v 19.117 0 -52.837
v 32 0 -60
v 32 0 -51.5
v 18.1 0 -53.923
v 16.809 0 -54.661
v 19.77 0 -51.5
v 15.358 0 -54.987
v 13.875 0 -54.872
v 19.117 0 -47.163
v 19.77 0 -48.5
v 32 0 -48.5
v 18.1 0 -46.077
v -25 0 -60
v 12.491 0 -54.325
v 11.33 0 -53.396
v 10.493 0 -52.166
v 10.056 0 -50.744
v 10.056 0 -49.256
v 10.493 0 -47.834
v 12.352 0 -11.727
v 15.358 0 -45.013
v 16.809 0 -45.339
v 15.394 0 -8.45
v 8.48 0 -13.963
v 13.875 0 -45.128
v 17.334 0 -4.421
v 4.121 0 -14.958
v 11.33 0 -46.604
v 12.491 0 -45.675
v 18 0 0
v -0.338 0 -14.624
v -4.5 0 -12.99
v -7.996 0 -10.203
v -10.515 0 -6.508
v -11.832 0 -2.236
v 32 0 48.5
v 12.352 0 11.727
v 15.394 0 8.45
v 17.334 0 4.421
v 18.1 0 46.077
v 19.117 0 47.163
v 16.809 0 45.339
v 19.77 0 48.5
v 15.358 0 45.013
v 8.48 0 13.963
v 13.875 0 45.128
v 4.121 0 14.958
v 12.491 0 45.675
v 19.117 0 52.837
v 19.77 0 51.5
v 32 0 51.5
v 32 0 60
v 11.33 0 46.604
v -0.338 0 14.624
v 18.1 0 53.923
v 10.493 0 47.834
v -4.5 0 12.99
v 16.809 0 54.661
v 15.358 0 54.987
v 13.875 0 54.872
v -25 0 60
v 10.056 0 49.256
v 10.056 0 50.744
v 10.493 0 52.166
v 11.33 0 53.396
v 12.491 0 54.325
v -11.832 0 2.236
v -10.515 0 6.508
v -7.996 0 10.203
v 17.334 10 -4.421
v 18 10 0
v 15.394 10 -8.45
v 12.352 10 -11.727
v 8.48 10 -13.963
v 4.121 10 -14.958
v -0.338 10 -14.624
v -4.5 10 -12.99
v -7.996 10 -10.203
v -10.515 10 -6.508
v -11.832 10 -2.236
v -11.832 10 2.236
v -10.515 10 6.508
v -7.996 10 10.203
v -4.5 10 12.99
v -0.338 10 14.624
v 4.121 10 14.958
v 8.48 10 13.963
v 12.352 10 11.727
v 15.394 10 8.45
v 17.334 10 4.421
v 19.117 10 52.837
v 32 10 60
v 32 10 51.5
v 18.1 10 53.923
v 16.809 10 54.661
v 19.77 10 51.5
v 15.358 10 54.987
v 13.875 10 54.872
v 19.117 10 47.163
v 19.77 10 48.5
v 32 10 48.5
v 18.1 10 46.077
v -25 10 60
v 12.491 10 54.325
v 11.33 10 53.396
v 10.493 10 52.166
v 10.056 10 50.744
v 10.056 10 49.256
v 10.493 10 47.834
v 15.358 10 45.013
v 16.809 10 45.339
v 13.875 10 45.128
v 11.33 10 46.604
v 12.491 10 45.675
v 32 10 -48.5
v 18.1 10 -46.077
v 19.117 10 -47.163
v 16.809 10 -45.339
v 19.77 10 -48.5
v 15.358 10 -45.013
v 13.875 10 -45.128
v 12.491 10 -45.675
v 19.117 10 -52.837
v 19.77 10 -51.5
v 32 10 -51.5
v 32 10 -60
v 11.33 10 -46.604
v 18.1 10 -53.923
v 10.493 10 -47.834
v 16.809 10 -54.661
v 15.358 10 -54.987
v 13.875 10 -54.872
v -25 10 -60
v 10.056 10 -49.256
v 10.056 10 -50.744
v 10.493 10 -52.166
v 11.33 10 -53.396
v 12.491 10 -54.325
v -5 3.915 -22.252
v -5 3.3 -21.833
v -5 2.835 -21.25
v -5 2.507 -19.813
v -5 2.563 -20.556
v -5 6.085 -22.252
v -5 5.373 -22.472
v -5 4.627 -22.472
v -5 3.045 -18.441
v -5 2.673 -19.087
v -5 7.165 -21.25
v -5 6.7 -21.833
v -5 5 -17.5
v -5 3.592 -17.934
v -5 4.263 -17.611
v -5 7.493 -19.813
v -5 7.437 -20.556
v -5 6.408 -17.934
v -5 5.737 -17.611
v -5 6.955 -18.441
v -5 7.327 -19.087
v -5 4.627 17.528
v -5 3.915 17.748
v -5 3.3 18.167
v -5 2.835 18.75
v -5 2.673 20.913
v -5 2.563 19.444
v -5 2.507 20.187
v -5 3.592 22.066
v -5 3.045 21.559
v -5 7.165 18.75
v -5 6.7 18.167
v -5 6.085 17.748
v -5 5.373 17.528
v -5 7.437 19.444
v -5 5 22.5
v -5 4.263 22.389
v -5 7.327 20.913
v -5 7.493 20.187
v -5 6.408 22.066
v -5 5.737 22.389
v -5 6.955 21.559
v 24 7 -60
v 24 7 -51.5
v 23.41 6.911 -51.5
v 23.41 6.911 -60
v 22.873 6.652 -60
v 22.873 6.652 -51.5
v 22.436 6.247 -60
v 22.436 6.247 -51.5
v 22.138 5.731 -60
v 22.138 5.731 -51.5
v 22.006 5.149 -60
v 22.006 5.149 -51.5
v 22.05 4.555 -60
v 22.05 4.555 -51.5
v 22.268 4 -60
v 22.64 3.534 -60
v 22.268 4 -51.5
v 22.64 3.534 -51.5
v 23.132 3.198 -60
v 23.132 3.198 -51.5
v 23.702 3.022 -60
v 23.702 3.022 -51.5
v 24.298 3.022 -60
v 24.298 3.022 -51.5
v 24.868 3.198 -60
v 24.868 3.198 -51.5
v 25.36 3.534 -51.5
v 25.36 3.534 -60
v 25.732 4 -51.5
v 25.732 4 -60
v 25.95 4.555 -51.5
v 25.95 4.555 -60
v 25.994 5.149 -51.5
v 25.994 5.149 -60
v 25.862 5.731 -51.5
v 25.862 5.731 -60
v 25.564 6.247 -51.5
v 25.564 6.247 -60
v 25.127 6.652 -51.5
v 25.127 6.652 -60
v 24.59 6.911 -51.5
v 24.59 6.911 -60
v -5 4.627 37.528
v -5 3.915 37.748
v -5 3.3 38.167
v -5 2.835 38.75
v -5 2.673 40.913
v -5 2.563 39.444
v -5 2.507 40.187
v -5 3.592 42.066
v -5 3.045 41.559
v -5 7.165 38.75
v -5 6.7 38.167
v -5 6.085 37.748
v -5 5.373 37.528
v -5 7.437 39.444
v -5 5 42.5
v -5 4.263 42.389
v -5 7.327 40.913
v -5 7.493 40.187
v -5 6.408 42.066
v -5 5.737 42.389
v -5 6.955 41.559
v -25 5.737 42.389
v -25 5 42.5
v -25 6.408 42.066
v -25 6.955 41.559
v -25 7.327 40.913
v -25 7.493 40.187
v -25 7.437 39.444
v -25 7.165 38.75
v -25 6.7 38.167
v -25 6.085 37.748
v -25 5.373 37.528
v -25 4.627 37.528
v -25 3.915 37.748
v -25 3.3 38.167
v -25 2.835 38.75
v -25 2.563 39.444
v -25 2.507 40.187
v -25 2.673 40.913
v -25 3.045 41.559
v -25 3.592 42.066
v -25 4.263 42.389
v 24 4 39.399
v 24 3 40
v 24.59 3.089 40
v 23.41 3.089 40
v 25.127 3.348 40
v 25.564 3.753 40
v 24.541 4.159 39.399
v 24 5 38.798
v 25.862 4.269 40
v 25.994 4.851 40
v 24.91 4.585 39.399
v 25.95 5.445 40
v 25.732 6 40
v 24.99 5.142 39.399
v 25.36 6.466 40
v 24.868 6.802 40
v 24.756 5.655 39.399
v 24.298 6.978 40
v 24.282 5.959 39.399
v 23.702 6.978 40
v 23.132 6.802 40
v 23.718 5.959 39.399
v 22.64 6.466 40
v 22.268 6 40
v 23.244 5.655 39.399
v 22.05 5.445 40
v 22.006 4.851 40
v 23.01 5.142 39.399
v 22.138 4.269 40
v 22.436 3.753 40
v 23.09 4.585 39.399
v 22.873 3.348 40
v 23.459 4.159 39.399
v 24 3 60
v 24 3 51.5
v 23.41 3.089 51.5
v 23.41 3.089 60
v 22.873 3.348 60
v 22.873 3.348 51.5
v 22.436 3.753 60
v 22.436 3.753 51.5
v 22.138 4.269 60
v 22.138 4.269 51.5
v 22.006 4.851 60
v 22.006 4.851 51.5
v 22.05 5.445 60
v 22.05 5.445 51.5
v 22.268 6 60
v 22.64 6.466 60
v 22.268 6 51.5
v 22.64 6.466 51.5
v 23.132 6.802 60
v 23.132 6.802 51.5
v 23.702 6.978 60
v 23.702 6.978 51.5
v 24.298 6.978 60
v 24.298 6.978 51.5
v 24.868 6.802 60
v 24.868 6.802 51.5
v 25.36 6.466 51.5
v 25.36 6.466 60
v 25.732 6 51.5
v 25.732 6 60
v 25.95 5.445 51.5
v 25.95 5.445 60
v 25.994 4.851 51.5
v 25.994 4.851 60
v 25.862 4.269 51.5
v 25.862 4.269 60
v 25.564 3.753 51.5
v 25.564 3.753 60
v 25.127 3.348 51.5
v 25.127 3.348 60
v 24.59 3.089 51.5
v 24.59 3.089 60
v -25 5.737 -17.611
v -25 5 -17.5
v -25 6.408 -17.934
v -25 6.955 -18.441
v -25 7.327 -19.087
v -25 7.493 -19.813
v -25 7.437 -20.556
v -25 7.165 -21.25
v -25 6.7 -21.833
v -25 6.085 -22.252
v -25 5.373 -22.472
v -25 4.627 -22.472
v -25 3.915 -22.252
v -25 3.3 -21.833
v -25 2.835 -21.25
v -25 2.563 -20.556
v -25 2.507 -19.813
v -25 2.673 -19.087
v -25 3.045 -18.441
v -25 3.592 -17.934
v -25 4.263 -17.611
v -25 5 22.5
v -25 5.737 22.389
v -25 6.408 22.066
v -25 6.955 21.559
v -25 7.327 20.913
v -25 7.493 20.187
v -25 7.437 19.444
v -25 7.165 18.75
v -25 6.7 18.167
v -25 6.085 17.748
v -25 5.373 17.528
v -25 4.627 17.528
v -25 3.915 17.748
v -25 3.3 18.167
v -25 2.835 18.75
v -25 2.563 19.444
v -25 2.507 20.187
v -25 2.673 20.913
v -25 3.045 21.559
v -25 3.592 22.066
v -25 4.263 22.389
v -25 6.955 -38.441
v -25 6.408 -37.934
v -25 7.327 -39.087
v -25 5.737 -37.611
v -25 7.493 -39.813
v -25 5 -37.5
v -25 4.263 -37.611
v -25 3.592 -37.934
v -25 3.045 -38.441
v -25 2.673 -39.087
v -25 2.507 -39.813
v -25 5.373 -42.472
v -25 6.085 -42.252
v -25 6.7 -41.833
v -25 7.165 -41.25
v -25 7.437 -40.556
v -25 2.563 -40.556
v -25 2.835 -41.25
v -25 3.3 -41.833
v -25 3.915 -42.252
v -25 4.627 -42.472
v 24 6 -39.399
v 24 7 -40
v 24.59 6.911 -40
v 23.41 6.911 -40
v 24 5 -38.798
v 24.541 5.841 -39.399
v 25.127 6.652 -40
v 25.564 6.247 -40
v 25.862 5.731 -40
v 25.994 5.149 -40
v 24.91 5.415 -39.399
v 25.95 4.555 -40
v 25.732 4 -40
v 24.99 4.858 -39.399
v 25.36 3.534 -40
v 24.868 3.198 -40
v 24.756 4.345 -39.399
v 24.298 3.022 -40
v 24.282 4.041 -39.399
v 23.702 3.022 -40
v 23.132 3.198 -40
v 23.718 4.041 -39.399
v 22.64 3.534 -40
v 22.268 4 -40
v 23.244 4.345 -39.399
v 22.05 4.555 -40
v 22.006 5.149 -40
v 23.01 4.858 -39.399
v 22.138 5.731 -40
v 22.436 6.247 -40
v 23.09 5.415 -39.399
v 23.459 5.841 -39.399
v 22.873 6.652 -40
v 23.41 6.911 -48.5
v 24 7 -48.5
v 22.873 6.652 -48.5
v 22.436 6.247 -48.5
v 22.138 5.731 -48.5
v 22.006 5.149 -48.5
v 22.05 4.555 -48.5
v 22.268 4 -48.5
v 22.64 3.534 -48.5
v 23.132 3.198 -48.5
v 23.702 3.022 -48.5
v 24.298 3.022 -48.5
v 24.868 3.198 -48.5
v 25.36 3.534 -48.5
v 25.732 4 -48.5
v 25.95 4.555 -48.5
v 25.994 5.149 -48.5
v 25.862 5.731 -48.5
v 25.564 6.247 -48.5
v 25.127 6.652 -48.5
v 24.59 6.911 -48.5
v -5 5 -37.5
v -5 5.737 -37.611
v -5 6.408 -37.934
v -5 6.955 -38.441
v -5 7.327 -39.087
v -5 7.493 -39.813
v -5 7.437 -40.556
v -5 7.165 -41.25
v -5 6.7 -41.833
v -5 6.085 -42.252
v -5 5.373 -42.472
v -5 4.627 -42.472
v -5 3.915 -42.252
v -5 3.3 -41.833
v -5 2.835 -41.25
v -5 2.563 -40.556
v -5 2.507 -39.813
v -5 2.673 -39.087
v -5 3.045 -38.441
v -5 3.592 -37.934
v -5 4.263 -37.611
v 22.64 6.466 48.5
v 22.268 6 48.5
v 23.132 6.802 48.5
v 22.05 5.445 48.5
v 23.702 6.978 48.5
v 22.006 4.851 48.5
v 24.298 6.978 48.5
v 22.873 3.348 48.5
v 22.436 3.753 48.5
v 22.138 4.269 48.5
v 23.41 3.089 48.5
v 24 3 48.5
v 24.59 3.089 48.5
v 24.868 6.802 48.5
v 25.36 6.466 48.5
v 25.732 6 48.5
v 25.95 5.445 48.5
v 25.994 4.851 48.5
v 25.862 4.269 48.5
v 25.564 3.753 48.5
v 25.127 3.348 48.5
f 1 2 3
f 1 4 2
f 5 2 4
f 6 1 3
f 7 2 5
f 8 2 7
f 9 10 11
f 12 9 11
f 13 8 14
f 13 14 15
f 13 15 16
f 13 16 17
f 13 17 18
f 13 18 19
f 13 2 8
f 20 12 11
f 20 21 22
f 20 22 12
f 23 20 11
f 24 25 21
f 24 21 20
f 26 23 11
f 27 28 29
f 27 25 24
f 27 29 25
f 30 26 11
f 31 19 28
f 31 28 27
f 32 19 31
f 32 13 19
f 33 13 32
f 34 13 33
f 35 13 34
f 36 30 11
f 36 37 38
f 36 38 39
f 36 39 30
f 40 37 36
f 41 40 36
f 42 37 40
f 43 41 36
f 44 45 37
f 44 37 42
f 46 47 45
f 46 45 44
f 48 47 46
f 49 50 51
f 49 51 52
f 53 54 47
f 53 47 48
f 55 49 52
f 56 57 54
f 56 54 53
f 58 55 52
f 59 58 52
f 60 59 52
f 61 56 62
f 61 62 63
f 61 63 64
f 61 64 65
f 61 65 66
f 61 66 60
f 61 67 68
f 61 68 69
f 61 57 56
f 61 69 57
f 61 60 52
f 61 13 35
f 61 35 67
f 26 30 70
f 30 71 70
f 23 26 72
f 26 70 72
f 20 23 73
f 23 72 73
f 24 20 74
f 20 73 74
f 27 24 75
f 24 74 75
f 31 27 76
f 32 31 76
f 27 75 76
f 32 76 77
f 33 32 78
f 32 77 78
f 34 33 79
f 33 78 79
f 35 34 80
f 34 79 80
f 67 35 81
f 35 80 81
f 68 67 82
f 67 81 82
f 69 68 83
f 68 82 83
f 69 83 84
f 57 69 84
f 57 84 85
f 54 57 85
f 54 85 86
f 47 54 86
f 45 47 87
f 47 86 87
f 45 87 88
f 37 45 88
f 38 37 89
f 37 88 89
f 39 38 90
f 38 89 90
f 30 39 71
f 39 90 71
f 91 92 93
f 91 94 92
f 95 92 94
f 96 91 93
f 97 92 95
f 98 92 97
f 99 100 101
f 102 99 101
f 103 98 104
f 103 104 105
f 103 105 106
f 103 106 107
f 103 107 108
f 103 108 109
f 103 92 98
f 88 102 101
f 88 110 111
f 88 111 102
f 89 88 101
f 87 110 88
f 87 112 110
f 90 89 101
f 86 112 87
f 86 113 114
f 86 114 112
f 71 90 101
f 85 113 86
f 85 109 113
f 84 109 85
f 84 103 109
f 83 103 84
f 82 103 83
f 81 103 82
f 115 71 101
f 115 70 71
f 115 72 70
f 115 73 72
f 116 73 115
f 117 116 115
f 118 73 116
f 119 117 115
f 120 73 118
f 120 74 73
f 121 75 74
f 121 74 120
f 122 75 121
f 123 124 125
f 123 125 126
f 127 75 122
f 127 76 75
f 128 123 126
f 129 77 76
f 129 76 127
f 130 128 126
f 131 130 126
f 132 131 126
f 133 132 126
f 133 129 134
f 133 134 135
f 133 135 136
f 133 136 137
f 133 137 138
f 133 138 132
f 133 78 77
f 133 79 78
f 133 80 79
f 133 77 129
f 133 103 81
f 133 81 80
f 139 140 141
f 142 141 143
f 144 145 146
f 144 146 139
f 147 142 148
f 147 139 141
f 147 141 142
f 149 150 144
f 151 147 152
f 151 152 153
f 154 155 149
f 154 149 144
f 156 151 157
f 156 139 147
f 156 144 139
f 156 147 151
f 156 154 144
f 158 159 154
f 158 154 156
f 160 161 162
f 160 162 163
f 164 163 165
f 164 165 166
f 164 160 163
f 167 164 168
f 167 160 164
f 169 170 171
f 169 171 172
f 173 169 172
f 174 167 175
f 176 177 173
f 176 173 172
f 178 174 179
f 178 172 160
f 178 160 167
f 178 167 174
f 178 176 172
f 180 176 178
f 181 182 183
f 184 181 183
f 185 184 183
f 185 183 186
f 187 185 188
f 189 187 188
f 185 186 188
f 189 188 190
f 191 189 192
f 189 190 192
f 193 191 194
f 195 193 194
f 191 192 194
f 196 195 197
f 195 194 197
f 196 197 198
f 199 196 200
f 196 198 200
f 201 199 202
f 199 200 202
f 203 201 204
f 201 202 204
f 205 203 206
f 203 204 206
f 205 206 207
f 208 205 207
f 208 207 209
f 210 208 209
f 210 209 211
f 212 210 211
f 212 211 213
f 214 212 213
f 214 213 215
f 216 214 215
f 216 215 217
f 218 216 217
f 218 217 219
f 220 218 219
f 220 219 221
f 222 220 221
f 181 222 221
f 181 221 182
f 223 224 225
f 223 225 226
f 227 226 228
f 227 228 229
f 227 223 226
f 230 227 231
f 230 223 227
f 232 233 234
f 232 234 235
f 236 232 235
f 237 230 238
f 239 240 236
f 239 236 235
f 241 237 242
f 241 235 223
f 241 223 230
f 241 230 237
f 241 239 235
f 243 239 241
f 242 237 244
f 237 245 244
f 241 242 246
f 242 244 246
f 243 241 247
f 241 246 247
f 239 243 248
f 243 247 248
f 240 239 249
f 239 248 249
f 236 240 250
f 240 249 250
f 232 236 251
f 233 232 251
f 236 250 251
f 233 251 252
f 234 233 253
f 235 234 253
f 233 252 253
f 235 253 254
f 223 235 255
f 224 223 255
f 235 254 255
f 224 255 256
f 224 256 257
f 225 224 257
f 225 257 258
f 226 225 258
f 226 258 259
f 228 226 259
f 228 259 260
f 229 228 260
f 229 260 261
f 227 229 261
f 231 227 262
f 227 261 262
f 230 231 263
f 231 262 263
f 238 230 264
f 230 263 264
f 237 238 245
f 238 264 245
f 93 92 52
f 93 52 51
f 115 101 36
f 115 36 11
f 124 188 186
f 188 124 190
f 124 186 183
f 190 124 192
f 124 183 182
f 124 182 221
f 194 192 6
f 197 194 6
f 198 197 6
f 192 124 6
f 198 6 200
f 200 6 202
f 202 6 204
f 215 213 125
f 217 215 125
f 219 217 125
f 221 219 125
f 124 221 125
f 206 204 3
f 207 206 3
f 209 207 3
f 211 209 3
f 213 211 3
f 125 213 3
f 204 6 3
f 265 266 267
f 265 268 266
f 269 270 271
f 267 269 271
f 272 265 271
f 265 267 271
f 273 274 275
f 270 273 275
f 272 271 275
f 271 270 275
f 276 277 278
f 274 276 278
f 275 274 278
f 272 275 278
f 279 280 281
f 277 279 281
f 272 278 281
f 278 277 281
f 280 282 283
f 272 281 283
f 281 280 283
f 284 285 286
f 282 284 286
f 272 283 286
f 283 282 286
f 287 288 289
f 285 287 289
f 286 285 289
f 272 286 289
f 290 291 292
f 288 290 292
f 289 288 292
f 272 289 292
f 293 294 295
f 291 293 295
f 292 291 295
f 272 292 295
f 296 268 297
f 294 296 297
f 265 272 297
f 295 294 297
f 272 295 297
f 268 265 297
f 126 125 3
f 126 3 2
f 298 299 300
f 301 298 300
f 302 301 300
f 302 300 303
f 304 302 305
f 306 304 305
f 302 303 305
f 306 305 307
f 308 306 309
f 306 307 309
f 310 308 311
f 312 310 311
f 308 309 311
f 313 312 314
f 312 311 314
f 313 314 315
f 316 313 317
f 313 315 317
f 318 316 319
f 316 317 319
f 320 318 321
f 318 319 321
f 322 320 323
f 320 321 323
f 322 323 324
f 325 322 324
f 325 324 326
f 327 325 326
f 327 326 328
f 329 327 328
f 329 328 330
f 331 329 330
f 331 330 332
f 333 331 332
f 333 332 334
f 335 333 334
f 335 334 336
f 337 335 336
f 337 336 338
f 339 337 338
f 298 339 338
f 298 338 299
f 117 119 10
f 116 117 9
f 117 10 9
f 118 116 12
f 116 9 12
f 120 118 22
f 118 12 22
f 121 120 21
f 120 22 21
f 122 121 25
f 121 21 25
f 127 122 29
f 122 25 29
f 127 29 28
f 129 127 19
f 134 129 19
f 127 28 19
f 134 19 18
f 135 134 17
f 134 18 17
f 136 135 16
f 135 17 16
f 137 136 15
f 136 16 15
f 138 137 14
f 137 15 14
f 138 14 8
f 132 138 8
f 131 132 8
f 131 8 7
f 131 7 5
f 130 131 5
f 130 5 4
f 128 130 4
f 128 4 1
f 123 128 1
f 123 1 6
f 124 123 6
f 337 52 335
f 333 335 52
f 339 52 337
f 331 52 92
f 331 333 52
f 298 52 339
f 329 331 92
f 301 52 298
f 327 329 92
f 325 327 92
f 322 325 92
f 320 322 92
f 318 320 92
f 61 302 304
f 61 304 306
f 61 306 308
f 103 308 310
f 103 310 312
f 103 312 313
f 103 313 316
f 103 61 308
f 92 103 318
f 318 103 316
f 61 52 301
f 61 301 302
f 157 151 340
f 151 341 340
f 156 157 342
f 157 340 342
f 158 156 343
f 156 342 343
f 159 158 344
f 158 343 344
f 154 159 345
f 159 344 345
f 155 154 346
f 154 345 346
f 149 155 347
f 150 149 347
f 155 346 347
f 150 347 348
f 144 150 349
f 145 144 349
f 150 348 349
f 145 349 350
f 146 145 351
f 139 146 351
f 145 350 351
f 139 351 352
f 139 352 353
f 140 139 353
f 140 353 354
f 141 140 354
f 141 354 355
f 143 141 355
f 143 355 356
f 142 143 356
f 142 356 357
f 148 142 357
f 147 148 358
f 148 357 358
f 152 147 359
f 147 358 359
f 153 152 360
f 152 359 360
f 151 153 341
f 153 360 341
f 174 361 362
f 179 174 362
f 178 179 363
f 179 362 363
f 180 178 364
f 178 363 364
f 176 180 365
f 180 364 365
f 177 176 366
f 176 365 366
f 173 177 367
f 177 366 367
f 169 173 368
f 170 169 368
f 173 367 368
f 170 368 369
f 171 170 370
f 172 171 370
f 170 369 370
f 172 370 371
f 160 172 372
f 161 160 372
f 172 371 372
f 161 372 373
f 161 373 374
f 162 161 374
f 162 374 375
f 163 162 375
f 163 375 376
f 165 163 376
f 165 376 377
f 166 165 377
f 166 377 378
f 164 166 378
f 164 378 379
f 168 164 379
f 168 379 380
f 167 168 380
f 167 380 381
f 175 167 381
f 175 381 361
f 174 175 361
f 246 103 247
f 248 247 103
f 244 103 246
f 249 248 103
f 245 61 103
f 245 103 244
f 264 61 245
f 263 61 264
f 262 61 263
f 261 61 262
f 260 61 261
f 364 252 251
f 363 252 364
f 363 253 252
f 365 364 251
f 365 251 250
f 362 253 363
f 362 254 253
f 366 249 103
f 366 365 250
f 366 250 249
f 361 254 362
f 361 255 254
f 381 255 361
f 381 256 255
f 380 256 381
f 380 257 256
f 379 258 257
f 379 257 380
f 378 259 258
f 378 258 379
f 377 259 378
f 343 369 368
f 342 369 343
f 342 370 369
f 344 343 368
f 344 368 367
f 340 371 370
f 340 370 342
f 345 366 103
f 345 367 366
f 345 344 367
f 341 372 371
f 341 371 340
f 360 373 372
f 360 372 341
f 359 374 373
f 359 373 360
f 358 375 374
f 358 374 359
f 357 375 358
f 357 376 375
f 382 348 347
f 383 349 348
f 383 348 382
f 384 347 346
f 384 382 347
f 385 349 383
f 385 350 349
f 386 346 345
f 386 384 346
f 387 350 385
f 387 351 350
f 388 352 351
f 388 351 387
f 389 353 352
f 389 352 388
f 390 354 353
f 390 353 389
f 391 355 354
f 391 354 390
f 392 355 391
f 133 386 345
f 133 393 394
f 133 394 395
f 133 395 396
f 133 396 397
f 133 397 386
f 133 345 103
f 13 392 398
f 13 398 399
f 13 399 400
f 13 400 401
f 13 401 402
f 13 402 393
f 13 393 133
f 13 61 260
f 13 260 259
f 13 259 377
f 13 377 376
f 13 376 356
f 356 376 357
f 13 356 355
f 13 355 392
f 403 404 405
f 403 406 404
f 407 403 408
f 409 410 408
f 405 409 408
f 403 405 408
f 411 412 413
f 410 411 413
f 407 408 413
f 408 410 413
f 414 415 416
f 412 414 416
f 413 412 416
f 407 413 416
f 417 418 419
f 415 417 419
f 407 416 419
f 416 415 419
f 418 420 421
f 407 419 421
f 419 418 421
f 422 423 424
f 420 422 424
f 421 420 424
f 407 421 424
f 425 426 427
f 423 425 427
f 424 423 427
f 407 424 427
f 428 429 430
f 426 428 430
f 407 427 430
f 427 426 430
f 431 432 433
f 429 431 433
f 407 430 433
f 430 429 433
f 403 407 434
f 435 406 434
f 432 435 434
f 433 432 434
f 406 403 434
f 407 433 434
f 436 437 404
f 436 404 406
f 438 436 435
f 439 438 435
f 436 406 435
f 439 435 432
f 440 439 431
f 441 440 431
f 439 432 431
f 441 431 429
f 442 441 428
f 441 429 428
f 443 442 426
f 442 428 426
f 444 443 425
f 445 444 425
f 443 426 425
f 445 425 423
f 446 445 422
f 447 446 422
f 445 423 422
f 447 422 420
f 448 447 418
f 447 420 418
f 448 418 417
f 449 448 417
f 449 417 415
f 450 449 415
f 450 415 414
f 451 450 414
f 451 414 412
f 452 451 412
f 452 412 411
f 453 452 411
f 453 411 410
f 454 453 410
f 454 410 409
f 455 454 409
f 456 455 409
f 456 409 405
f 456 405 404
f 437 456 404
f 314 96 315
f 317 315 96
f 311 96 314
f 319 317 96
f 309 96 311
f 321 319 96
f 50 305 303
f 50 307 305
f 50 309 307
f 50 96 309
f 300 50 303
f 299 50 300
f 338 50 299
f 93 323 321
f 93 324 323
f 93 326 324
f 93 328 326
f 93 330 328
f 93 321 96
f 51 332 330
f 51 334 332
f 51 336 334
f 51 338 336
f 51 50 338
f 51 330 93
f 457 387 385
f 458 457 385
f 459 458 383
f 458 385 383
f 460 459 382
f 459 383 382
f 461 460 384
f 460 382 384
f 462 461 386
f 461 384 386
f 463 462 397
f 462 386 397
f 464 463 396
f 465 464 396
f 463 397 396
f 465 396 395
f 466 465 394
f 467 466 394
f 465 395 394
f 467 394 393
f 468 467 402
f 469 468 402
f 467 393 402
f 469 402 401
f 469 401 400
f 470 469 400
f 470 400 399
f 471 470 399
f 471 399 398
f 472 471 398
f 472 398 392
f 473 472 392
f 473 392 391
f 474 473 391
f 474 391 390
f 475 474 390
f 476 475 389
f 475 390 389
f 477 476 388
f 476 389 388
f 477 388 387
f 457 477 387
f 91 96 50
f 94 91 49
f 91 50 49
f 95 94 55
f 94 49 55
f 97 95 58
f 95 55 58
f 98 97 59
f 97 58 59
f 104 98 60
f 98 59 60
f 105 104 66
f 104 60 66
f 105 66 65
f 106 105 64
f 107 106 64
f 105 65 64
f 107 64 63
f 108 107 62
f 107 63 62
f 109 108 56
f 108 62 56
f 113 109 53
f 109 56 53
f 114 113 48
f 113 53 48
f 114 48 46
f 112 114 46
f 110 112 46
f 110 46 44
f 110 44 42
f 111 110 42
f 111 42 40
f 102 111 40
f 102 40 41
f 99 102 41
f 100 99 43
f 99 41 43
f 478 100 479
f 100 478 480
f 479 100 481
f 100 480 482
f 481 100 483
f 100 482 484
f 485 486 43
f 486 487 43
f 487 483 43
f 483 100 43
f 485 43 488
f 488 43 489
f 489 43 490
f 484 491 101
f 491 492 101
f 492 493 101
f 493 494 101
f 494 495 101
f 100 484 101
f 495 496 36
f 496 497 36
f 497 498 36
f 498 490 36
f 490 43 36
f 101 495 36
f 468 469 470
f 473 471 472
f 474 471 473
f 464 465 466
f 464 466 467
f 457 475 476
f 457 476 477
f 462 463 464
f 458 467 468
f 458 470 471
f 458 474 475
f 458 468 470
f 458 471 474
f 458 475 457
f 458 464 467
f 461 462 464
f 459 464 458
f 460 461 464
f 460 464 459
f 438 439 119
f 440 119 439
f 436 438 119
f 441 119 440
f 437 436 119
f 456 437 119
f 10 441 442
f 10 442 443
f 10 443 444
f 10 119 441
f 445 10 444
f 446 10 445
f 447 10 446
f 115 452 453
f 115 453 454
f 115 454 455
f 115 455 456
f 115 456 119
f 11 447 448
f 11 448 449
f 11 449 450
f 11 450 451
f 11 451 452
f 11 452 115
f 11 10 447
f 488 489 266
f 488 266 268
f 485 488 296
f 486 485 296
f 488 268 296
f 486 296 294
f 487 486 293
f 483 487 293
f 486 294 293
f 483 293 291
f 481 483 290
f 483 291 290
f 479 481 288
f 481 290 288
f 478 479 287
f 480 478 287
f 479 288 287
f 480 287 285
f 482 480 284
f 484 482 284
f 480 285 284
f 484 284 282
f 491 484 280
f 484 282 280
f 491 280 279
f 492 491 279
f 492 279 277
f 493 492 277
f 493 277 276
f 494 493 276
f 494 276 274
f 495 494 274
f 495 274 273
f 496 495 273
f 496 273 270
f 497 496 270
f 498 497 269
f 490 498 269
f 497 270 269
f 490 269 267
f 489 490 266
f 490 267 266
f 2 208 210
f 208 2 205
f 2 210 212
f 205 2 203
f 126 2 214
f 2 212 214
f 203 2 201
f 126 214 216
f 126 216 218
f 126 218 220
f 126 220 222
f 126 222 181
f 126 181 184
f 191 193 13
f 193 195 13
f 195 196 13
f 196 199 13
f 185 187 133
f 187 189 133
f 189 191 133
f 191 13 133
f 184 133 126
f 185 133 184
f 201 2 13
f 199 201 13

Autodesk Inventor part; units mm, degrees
ref_plane "YZ Plane" through (0, 0, 0) normal (1, 0, 0) x (0, 1, 0)
ref_plane "XZ Plane" through (0, 0, 0) normal (0, 1, 0) x (-1, 0, 0)
ref_plane "XY Plane" through (0, 0, 0) normal (0, 0, 1) x (1, 0, 0)
sketch "Szkic10" plane through (0, 0, 0) normal (0, 1, 0) x (-1, 0, 0)
  line L0 (-25, 60) -> (25, 60)
  line L1 (25, 60) -> (25, -60)
  line L2 (25, -60) -> (-25, -60)
  line L3 (-25, -60) -> (-25, 60)
  line L4 (-25, 60) -> (25, -60) construction
  line L5 (25, 60) -> (-25, -60) construction
  point P0 (0, 0)
  dimension "d75" = 50
  dimension "d76" = 120
extrude "Wyciągnięcie proste6" add sketch "Szkic10" along normal blind 10
sketch "Szkic11" plane through (-25, 0, -60) normal (-1, 0, 0) x (0, 0, 1)
  line L0 (120, 0) -> (0, 0) projected
  line L1 (120, 0) -> (120, 10) projected
  line L2 (0, 10) -> (120, 10) projected
  line L3 (0, 0) -> (0, 10) projected
  line L4 (0, 0) -> (120, 0) projected
  line L5 (0, 0) -> (0, 5)
  line L6 (0, 5) -> (120, 5)
  line L7 (0, 5) -> (20, 5)
  line L8 (20, 5) -> (40, 5)
  line L9 (40, 5) -> (80, 5)
  line L10 (80, 5) -> (100, 5)
  circle A0 centre (20, 5) radius 2.5
  circle A1 centre (40, 5) radius 2.5
  circle A2 centre (80, 5) radius 2.5
  circle A3 centre (100, 5) radius 2.5
  point P0 (60, 0)
  dimension "d79" = 5
  dimension "d80" = 20
  dimension "d81" = 20
  dimension "d84" = 5
  dimension "d85" = 5
  dimension "d86" = 5
  dimension "d87" = 5
  dimension "d105" = 20
  dimension "d106" = 20
extrude "Wyciągnięcie proste7" cut sketch "Szkic11" against normal blind 20 contours A3 L6 | L6 A3 | A0 L6 | L6 A0 | A2 L6 | L6 A2 | A1 L6 | L6 A1
sketch "Szkic12" plane through (0, 10, 0) normal (0, 1, 0) x (1, 0, 0)
  line L0 (25, -60) -> (25, 60) projected
  line L1 (25, 0) -> (3, 0)
  circle A0 centre (3, 0) radius 15
  point P0 (0, 0)
  dimension "d102" = 22
  dimension "d103" = 30
extrude "Wyciągnięcie proste8" cut sketch "Szkic12" against normal up to next
sketch "Szkic13" plane through (0, 0, 0) normal (0, -1, 0) x (1, 0, 0)
  line L0 (25, 60) -> (-25, 60) projected
  line L1 (-25, 60) -> (-25, -60) projected
  line L2 (-25, -60) -> (25, -60) projected
  line L3 (25, -60) -> (25, 60) projected
  line L4 (25, 60) -> (25, 50)
  line L5 (25, -60) -> (25, 60) projected
  line L6 (25, 50) -> (-25, 50)
  line L7 (25, -60) -> (25, -50)
  line L8 (25, -50) -> (-25, -50)
  line L9 (25, 50) -> (15, 50)
  line L10 (25, -50) -> (15, -50)
  circle A0 centre (15, 50) radius 5
  circle A1 centre (15, -50) radius 5
  point P0 (0, 0)
  dimension "d93" = 10
  dimension "d94" = 10
  dimension "d95" = 10
  dimension "d96" = 10
  dimension "d97" = 10
  dimension "d98" = 10
extrude "Wyciągnięcie proste9" cut sketch "Szkic13" against normal blind 3 contours A0 L6 | L6 A0 | A1 L8 | L8 A1
sketch "Szkic14" plane through (15, 3, -50) normal (0, -1, 0) x (1, 0, 0)
  circle A0 centre (0, 0) radius 5 projected
  circle A1 centre (0, 100) radius 5 projected
  point P0 (-15, 50)
extrude "Wyciągnięcie proste10" cut sketch "Szkic14" against normal blind 10
sketch "Szkic15" plane through (25, 0, 60) normal (1, 0, 0) x (0, 0, -1)
  line L0 (120, 0) -> (0, 0) projected
  line L1 (120, 0) -> (120, 10) projected
  line L2 (0, 10) -> (120, 10) projected
  line L3 (0, 0) -> (0, 10) projected
  point P0 (60, 0)
extrude "Wyciągnięcie proste11" add sketch "Szkic15" along normal blind 7
sketch "Szkic16" plane through (-25, 0, 60) normal (0, 0, 1) x (1, 0, 0)
  line L0 (57, 0) -> (0, 0) projected
  line L1 (57, 10) -> (57, 0) projected
  line L2 (0, 10) -> (57, 10) projected
  line L3 (0, 0) -> (0, 10) projected
  line L4 (35, 10) -> (45, 10) projected
  line L5 (45, 0) -> (35, 0) projected
  line L6 (53, 0) -> (45, 0)
  line L7 (57, 0) -> (0, 0) projected
  line L8 (45, 0) -> (45, 10)
  line L9 (0, 10) -> (57, 10) projected
  line L10 (57, 10) -> (57, 0) projected
  line L11 (53, 5) -> (45, 5)
  line L12 (45, 5) -> (49, 5)
  circle A0 centre (49, 5) radius 2
  line L13 (49, 5) -> (53, 5)
  line L14 (53, 5) -> (53, 10)
  line L15 (53, 5) -> (53, 0)
  point P0 (25, 0)
  dimension "d113" = 4
  dimension "d114" = 4
  dimension "d115" = 5
  dimension "d116" = 45
  dimension "d117" = 4
sketch "Szkic17" plane through (-25, 0, -60) normal (0, 0, -1) x (-1, 0, 0)
  line L0 (-53, 10) -> (0, 10)
  line L1 (-53, 0) -> (-53, 10)
  line L2 (0, 0) -> (-53, 0)
  line L3 (0, 10) -> (0, 0)
  line L4 (-35, 0) -> (-45, 0)
  line L5 (-45, 10) -> (-35, 10)
  line L6 (-53, 10) -> (-45, 10)
  line L7 (-53, 10) -> (0, 10)
  line L8 (-45, 10) -> (-45, 0)
  line L9 (0, 0) -> (-53, 0)
  line L10 (-53, 0) -> (-53, 10)
  line L11 (-53, 5) -> (-45, 5)
  line L12 (-45, 5) -> (-49, 5)
  circle A0 centre (-49, 5) radius 2
  line L13 (-49, 5) -> (-53, 5)
  line L14 (-53, 5) -> (-53, 0)
  line L15 (-53, 5) -> (-53, 10)
  line L16 (0, 0) -> (-57, 0) projected
  line L17 (0, 0) -> (0, 10) projected
  point P0 (-25, 0)
  point P1 (-25, 10)
  dimension "d119" = 4
  dimension "d120" = 4
  dimension "d121" = 5
  dimension "d122" = 45
  dimension "d123" = 4
hole "Otwór4" at (24, 5, -60) direction (0, 0, 1) diameter 4 depth 20 tip angle 118
hole "Otwór5" at (24, 5, 60) direction (0, 0, -1) diameter 4 depth 20 tip angle 118
sketch "Szkic18" plane through (0, 0, 0) normal (0, -1, 0) x (1, 0, 0)
  circle A0 centre (15, -50) radius 5 projected
  circle A1 centre (15, 50) radius 5 projected
  circle A2 centre (3, 0) radius 15 projected
  line L0 (32, 60) -> (-25, 60) projected
  line L1 (-25, 60) -> (-25, -60) projected
  line L2 (-25, -60) -> (32, -60) projected
  line L3 (32, 60) -> (32, -60) projected
  line L4 (15, -50) -> (32, -50)
  line L5 (15, 50) -> (32, 50)
  line L6 (32, -60) -> (32, 60) projected
  line L7 (15, 50) -> (15, 51.5)
  line L8 (15, 51.5) -> (32, 51.5)
  line L9 (15, 50) -> (15, 48.5)
  line L10 (15, 48.5) -> (32, 48.5)
  line L11 (15, -50) -> (15, -48.5)
  line L12 (15, -48.5) -> (32, -48.5)
  line L13 (15, -50) -> (15, -51.5)
  line L14 (15, -51.5) -> (32, -51.5)
  point P0 (0, 0)
  dimension "d138" = 1.5
  dimension "d139" = 1.5
  dimension "d140" = 1.5
  dimension "d141" = 1.5
extrude "Wyciągnięcie proste12" cut sketch "Szkic18" against normal up to next contours L4 L11 L12 A0 | L4 L3 L14 A0 | A0 L14 L13 L4 | A0 L12 L3 L4 | L10 A1 L5 L3 | L5 A1 L8 L3 | L10 L9 L5 A1 | L5 L7 L8 A1
thread "Gwint9" size "M5x0.8" class "6H" standard "ANSI Metric M Profile" full length
thread "Gwint10" size "M5x0.8" class "6H" standard "ANSI Metric M Profile" full length
thread "Gwint11" size "M5x0.8" class "6H" standard "ANSI Metric M Profile" full length
thread "Gwint12" size "M5x0.8" class "6H" standard "ANSI Metric M Profile" full length
properties part number "Podstawa dolna osi Z"
